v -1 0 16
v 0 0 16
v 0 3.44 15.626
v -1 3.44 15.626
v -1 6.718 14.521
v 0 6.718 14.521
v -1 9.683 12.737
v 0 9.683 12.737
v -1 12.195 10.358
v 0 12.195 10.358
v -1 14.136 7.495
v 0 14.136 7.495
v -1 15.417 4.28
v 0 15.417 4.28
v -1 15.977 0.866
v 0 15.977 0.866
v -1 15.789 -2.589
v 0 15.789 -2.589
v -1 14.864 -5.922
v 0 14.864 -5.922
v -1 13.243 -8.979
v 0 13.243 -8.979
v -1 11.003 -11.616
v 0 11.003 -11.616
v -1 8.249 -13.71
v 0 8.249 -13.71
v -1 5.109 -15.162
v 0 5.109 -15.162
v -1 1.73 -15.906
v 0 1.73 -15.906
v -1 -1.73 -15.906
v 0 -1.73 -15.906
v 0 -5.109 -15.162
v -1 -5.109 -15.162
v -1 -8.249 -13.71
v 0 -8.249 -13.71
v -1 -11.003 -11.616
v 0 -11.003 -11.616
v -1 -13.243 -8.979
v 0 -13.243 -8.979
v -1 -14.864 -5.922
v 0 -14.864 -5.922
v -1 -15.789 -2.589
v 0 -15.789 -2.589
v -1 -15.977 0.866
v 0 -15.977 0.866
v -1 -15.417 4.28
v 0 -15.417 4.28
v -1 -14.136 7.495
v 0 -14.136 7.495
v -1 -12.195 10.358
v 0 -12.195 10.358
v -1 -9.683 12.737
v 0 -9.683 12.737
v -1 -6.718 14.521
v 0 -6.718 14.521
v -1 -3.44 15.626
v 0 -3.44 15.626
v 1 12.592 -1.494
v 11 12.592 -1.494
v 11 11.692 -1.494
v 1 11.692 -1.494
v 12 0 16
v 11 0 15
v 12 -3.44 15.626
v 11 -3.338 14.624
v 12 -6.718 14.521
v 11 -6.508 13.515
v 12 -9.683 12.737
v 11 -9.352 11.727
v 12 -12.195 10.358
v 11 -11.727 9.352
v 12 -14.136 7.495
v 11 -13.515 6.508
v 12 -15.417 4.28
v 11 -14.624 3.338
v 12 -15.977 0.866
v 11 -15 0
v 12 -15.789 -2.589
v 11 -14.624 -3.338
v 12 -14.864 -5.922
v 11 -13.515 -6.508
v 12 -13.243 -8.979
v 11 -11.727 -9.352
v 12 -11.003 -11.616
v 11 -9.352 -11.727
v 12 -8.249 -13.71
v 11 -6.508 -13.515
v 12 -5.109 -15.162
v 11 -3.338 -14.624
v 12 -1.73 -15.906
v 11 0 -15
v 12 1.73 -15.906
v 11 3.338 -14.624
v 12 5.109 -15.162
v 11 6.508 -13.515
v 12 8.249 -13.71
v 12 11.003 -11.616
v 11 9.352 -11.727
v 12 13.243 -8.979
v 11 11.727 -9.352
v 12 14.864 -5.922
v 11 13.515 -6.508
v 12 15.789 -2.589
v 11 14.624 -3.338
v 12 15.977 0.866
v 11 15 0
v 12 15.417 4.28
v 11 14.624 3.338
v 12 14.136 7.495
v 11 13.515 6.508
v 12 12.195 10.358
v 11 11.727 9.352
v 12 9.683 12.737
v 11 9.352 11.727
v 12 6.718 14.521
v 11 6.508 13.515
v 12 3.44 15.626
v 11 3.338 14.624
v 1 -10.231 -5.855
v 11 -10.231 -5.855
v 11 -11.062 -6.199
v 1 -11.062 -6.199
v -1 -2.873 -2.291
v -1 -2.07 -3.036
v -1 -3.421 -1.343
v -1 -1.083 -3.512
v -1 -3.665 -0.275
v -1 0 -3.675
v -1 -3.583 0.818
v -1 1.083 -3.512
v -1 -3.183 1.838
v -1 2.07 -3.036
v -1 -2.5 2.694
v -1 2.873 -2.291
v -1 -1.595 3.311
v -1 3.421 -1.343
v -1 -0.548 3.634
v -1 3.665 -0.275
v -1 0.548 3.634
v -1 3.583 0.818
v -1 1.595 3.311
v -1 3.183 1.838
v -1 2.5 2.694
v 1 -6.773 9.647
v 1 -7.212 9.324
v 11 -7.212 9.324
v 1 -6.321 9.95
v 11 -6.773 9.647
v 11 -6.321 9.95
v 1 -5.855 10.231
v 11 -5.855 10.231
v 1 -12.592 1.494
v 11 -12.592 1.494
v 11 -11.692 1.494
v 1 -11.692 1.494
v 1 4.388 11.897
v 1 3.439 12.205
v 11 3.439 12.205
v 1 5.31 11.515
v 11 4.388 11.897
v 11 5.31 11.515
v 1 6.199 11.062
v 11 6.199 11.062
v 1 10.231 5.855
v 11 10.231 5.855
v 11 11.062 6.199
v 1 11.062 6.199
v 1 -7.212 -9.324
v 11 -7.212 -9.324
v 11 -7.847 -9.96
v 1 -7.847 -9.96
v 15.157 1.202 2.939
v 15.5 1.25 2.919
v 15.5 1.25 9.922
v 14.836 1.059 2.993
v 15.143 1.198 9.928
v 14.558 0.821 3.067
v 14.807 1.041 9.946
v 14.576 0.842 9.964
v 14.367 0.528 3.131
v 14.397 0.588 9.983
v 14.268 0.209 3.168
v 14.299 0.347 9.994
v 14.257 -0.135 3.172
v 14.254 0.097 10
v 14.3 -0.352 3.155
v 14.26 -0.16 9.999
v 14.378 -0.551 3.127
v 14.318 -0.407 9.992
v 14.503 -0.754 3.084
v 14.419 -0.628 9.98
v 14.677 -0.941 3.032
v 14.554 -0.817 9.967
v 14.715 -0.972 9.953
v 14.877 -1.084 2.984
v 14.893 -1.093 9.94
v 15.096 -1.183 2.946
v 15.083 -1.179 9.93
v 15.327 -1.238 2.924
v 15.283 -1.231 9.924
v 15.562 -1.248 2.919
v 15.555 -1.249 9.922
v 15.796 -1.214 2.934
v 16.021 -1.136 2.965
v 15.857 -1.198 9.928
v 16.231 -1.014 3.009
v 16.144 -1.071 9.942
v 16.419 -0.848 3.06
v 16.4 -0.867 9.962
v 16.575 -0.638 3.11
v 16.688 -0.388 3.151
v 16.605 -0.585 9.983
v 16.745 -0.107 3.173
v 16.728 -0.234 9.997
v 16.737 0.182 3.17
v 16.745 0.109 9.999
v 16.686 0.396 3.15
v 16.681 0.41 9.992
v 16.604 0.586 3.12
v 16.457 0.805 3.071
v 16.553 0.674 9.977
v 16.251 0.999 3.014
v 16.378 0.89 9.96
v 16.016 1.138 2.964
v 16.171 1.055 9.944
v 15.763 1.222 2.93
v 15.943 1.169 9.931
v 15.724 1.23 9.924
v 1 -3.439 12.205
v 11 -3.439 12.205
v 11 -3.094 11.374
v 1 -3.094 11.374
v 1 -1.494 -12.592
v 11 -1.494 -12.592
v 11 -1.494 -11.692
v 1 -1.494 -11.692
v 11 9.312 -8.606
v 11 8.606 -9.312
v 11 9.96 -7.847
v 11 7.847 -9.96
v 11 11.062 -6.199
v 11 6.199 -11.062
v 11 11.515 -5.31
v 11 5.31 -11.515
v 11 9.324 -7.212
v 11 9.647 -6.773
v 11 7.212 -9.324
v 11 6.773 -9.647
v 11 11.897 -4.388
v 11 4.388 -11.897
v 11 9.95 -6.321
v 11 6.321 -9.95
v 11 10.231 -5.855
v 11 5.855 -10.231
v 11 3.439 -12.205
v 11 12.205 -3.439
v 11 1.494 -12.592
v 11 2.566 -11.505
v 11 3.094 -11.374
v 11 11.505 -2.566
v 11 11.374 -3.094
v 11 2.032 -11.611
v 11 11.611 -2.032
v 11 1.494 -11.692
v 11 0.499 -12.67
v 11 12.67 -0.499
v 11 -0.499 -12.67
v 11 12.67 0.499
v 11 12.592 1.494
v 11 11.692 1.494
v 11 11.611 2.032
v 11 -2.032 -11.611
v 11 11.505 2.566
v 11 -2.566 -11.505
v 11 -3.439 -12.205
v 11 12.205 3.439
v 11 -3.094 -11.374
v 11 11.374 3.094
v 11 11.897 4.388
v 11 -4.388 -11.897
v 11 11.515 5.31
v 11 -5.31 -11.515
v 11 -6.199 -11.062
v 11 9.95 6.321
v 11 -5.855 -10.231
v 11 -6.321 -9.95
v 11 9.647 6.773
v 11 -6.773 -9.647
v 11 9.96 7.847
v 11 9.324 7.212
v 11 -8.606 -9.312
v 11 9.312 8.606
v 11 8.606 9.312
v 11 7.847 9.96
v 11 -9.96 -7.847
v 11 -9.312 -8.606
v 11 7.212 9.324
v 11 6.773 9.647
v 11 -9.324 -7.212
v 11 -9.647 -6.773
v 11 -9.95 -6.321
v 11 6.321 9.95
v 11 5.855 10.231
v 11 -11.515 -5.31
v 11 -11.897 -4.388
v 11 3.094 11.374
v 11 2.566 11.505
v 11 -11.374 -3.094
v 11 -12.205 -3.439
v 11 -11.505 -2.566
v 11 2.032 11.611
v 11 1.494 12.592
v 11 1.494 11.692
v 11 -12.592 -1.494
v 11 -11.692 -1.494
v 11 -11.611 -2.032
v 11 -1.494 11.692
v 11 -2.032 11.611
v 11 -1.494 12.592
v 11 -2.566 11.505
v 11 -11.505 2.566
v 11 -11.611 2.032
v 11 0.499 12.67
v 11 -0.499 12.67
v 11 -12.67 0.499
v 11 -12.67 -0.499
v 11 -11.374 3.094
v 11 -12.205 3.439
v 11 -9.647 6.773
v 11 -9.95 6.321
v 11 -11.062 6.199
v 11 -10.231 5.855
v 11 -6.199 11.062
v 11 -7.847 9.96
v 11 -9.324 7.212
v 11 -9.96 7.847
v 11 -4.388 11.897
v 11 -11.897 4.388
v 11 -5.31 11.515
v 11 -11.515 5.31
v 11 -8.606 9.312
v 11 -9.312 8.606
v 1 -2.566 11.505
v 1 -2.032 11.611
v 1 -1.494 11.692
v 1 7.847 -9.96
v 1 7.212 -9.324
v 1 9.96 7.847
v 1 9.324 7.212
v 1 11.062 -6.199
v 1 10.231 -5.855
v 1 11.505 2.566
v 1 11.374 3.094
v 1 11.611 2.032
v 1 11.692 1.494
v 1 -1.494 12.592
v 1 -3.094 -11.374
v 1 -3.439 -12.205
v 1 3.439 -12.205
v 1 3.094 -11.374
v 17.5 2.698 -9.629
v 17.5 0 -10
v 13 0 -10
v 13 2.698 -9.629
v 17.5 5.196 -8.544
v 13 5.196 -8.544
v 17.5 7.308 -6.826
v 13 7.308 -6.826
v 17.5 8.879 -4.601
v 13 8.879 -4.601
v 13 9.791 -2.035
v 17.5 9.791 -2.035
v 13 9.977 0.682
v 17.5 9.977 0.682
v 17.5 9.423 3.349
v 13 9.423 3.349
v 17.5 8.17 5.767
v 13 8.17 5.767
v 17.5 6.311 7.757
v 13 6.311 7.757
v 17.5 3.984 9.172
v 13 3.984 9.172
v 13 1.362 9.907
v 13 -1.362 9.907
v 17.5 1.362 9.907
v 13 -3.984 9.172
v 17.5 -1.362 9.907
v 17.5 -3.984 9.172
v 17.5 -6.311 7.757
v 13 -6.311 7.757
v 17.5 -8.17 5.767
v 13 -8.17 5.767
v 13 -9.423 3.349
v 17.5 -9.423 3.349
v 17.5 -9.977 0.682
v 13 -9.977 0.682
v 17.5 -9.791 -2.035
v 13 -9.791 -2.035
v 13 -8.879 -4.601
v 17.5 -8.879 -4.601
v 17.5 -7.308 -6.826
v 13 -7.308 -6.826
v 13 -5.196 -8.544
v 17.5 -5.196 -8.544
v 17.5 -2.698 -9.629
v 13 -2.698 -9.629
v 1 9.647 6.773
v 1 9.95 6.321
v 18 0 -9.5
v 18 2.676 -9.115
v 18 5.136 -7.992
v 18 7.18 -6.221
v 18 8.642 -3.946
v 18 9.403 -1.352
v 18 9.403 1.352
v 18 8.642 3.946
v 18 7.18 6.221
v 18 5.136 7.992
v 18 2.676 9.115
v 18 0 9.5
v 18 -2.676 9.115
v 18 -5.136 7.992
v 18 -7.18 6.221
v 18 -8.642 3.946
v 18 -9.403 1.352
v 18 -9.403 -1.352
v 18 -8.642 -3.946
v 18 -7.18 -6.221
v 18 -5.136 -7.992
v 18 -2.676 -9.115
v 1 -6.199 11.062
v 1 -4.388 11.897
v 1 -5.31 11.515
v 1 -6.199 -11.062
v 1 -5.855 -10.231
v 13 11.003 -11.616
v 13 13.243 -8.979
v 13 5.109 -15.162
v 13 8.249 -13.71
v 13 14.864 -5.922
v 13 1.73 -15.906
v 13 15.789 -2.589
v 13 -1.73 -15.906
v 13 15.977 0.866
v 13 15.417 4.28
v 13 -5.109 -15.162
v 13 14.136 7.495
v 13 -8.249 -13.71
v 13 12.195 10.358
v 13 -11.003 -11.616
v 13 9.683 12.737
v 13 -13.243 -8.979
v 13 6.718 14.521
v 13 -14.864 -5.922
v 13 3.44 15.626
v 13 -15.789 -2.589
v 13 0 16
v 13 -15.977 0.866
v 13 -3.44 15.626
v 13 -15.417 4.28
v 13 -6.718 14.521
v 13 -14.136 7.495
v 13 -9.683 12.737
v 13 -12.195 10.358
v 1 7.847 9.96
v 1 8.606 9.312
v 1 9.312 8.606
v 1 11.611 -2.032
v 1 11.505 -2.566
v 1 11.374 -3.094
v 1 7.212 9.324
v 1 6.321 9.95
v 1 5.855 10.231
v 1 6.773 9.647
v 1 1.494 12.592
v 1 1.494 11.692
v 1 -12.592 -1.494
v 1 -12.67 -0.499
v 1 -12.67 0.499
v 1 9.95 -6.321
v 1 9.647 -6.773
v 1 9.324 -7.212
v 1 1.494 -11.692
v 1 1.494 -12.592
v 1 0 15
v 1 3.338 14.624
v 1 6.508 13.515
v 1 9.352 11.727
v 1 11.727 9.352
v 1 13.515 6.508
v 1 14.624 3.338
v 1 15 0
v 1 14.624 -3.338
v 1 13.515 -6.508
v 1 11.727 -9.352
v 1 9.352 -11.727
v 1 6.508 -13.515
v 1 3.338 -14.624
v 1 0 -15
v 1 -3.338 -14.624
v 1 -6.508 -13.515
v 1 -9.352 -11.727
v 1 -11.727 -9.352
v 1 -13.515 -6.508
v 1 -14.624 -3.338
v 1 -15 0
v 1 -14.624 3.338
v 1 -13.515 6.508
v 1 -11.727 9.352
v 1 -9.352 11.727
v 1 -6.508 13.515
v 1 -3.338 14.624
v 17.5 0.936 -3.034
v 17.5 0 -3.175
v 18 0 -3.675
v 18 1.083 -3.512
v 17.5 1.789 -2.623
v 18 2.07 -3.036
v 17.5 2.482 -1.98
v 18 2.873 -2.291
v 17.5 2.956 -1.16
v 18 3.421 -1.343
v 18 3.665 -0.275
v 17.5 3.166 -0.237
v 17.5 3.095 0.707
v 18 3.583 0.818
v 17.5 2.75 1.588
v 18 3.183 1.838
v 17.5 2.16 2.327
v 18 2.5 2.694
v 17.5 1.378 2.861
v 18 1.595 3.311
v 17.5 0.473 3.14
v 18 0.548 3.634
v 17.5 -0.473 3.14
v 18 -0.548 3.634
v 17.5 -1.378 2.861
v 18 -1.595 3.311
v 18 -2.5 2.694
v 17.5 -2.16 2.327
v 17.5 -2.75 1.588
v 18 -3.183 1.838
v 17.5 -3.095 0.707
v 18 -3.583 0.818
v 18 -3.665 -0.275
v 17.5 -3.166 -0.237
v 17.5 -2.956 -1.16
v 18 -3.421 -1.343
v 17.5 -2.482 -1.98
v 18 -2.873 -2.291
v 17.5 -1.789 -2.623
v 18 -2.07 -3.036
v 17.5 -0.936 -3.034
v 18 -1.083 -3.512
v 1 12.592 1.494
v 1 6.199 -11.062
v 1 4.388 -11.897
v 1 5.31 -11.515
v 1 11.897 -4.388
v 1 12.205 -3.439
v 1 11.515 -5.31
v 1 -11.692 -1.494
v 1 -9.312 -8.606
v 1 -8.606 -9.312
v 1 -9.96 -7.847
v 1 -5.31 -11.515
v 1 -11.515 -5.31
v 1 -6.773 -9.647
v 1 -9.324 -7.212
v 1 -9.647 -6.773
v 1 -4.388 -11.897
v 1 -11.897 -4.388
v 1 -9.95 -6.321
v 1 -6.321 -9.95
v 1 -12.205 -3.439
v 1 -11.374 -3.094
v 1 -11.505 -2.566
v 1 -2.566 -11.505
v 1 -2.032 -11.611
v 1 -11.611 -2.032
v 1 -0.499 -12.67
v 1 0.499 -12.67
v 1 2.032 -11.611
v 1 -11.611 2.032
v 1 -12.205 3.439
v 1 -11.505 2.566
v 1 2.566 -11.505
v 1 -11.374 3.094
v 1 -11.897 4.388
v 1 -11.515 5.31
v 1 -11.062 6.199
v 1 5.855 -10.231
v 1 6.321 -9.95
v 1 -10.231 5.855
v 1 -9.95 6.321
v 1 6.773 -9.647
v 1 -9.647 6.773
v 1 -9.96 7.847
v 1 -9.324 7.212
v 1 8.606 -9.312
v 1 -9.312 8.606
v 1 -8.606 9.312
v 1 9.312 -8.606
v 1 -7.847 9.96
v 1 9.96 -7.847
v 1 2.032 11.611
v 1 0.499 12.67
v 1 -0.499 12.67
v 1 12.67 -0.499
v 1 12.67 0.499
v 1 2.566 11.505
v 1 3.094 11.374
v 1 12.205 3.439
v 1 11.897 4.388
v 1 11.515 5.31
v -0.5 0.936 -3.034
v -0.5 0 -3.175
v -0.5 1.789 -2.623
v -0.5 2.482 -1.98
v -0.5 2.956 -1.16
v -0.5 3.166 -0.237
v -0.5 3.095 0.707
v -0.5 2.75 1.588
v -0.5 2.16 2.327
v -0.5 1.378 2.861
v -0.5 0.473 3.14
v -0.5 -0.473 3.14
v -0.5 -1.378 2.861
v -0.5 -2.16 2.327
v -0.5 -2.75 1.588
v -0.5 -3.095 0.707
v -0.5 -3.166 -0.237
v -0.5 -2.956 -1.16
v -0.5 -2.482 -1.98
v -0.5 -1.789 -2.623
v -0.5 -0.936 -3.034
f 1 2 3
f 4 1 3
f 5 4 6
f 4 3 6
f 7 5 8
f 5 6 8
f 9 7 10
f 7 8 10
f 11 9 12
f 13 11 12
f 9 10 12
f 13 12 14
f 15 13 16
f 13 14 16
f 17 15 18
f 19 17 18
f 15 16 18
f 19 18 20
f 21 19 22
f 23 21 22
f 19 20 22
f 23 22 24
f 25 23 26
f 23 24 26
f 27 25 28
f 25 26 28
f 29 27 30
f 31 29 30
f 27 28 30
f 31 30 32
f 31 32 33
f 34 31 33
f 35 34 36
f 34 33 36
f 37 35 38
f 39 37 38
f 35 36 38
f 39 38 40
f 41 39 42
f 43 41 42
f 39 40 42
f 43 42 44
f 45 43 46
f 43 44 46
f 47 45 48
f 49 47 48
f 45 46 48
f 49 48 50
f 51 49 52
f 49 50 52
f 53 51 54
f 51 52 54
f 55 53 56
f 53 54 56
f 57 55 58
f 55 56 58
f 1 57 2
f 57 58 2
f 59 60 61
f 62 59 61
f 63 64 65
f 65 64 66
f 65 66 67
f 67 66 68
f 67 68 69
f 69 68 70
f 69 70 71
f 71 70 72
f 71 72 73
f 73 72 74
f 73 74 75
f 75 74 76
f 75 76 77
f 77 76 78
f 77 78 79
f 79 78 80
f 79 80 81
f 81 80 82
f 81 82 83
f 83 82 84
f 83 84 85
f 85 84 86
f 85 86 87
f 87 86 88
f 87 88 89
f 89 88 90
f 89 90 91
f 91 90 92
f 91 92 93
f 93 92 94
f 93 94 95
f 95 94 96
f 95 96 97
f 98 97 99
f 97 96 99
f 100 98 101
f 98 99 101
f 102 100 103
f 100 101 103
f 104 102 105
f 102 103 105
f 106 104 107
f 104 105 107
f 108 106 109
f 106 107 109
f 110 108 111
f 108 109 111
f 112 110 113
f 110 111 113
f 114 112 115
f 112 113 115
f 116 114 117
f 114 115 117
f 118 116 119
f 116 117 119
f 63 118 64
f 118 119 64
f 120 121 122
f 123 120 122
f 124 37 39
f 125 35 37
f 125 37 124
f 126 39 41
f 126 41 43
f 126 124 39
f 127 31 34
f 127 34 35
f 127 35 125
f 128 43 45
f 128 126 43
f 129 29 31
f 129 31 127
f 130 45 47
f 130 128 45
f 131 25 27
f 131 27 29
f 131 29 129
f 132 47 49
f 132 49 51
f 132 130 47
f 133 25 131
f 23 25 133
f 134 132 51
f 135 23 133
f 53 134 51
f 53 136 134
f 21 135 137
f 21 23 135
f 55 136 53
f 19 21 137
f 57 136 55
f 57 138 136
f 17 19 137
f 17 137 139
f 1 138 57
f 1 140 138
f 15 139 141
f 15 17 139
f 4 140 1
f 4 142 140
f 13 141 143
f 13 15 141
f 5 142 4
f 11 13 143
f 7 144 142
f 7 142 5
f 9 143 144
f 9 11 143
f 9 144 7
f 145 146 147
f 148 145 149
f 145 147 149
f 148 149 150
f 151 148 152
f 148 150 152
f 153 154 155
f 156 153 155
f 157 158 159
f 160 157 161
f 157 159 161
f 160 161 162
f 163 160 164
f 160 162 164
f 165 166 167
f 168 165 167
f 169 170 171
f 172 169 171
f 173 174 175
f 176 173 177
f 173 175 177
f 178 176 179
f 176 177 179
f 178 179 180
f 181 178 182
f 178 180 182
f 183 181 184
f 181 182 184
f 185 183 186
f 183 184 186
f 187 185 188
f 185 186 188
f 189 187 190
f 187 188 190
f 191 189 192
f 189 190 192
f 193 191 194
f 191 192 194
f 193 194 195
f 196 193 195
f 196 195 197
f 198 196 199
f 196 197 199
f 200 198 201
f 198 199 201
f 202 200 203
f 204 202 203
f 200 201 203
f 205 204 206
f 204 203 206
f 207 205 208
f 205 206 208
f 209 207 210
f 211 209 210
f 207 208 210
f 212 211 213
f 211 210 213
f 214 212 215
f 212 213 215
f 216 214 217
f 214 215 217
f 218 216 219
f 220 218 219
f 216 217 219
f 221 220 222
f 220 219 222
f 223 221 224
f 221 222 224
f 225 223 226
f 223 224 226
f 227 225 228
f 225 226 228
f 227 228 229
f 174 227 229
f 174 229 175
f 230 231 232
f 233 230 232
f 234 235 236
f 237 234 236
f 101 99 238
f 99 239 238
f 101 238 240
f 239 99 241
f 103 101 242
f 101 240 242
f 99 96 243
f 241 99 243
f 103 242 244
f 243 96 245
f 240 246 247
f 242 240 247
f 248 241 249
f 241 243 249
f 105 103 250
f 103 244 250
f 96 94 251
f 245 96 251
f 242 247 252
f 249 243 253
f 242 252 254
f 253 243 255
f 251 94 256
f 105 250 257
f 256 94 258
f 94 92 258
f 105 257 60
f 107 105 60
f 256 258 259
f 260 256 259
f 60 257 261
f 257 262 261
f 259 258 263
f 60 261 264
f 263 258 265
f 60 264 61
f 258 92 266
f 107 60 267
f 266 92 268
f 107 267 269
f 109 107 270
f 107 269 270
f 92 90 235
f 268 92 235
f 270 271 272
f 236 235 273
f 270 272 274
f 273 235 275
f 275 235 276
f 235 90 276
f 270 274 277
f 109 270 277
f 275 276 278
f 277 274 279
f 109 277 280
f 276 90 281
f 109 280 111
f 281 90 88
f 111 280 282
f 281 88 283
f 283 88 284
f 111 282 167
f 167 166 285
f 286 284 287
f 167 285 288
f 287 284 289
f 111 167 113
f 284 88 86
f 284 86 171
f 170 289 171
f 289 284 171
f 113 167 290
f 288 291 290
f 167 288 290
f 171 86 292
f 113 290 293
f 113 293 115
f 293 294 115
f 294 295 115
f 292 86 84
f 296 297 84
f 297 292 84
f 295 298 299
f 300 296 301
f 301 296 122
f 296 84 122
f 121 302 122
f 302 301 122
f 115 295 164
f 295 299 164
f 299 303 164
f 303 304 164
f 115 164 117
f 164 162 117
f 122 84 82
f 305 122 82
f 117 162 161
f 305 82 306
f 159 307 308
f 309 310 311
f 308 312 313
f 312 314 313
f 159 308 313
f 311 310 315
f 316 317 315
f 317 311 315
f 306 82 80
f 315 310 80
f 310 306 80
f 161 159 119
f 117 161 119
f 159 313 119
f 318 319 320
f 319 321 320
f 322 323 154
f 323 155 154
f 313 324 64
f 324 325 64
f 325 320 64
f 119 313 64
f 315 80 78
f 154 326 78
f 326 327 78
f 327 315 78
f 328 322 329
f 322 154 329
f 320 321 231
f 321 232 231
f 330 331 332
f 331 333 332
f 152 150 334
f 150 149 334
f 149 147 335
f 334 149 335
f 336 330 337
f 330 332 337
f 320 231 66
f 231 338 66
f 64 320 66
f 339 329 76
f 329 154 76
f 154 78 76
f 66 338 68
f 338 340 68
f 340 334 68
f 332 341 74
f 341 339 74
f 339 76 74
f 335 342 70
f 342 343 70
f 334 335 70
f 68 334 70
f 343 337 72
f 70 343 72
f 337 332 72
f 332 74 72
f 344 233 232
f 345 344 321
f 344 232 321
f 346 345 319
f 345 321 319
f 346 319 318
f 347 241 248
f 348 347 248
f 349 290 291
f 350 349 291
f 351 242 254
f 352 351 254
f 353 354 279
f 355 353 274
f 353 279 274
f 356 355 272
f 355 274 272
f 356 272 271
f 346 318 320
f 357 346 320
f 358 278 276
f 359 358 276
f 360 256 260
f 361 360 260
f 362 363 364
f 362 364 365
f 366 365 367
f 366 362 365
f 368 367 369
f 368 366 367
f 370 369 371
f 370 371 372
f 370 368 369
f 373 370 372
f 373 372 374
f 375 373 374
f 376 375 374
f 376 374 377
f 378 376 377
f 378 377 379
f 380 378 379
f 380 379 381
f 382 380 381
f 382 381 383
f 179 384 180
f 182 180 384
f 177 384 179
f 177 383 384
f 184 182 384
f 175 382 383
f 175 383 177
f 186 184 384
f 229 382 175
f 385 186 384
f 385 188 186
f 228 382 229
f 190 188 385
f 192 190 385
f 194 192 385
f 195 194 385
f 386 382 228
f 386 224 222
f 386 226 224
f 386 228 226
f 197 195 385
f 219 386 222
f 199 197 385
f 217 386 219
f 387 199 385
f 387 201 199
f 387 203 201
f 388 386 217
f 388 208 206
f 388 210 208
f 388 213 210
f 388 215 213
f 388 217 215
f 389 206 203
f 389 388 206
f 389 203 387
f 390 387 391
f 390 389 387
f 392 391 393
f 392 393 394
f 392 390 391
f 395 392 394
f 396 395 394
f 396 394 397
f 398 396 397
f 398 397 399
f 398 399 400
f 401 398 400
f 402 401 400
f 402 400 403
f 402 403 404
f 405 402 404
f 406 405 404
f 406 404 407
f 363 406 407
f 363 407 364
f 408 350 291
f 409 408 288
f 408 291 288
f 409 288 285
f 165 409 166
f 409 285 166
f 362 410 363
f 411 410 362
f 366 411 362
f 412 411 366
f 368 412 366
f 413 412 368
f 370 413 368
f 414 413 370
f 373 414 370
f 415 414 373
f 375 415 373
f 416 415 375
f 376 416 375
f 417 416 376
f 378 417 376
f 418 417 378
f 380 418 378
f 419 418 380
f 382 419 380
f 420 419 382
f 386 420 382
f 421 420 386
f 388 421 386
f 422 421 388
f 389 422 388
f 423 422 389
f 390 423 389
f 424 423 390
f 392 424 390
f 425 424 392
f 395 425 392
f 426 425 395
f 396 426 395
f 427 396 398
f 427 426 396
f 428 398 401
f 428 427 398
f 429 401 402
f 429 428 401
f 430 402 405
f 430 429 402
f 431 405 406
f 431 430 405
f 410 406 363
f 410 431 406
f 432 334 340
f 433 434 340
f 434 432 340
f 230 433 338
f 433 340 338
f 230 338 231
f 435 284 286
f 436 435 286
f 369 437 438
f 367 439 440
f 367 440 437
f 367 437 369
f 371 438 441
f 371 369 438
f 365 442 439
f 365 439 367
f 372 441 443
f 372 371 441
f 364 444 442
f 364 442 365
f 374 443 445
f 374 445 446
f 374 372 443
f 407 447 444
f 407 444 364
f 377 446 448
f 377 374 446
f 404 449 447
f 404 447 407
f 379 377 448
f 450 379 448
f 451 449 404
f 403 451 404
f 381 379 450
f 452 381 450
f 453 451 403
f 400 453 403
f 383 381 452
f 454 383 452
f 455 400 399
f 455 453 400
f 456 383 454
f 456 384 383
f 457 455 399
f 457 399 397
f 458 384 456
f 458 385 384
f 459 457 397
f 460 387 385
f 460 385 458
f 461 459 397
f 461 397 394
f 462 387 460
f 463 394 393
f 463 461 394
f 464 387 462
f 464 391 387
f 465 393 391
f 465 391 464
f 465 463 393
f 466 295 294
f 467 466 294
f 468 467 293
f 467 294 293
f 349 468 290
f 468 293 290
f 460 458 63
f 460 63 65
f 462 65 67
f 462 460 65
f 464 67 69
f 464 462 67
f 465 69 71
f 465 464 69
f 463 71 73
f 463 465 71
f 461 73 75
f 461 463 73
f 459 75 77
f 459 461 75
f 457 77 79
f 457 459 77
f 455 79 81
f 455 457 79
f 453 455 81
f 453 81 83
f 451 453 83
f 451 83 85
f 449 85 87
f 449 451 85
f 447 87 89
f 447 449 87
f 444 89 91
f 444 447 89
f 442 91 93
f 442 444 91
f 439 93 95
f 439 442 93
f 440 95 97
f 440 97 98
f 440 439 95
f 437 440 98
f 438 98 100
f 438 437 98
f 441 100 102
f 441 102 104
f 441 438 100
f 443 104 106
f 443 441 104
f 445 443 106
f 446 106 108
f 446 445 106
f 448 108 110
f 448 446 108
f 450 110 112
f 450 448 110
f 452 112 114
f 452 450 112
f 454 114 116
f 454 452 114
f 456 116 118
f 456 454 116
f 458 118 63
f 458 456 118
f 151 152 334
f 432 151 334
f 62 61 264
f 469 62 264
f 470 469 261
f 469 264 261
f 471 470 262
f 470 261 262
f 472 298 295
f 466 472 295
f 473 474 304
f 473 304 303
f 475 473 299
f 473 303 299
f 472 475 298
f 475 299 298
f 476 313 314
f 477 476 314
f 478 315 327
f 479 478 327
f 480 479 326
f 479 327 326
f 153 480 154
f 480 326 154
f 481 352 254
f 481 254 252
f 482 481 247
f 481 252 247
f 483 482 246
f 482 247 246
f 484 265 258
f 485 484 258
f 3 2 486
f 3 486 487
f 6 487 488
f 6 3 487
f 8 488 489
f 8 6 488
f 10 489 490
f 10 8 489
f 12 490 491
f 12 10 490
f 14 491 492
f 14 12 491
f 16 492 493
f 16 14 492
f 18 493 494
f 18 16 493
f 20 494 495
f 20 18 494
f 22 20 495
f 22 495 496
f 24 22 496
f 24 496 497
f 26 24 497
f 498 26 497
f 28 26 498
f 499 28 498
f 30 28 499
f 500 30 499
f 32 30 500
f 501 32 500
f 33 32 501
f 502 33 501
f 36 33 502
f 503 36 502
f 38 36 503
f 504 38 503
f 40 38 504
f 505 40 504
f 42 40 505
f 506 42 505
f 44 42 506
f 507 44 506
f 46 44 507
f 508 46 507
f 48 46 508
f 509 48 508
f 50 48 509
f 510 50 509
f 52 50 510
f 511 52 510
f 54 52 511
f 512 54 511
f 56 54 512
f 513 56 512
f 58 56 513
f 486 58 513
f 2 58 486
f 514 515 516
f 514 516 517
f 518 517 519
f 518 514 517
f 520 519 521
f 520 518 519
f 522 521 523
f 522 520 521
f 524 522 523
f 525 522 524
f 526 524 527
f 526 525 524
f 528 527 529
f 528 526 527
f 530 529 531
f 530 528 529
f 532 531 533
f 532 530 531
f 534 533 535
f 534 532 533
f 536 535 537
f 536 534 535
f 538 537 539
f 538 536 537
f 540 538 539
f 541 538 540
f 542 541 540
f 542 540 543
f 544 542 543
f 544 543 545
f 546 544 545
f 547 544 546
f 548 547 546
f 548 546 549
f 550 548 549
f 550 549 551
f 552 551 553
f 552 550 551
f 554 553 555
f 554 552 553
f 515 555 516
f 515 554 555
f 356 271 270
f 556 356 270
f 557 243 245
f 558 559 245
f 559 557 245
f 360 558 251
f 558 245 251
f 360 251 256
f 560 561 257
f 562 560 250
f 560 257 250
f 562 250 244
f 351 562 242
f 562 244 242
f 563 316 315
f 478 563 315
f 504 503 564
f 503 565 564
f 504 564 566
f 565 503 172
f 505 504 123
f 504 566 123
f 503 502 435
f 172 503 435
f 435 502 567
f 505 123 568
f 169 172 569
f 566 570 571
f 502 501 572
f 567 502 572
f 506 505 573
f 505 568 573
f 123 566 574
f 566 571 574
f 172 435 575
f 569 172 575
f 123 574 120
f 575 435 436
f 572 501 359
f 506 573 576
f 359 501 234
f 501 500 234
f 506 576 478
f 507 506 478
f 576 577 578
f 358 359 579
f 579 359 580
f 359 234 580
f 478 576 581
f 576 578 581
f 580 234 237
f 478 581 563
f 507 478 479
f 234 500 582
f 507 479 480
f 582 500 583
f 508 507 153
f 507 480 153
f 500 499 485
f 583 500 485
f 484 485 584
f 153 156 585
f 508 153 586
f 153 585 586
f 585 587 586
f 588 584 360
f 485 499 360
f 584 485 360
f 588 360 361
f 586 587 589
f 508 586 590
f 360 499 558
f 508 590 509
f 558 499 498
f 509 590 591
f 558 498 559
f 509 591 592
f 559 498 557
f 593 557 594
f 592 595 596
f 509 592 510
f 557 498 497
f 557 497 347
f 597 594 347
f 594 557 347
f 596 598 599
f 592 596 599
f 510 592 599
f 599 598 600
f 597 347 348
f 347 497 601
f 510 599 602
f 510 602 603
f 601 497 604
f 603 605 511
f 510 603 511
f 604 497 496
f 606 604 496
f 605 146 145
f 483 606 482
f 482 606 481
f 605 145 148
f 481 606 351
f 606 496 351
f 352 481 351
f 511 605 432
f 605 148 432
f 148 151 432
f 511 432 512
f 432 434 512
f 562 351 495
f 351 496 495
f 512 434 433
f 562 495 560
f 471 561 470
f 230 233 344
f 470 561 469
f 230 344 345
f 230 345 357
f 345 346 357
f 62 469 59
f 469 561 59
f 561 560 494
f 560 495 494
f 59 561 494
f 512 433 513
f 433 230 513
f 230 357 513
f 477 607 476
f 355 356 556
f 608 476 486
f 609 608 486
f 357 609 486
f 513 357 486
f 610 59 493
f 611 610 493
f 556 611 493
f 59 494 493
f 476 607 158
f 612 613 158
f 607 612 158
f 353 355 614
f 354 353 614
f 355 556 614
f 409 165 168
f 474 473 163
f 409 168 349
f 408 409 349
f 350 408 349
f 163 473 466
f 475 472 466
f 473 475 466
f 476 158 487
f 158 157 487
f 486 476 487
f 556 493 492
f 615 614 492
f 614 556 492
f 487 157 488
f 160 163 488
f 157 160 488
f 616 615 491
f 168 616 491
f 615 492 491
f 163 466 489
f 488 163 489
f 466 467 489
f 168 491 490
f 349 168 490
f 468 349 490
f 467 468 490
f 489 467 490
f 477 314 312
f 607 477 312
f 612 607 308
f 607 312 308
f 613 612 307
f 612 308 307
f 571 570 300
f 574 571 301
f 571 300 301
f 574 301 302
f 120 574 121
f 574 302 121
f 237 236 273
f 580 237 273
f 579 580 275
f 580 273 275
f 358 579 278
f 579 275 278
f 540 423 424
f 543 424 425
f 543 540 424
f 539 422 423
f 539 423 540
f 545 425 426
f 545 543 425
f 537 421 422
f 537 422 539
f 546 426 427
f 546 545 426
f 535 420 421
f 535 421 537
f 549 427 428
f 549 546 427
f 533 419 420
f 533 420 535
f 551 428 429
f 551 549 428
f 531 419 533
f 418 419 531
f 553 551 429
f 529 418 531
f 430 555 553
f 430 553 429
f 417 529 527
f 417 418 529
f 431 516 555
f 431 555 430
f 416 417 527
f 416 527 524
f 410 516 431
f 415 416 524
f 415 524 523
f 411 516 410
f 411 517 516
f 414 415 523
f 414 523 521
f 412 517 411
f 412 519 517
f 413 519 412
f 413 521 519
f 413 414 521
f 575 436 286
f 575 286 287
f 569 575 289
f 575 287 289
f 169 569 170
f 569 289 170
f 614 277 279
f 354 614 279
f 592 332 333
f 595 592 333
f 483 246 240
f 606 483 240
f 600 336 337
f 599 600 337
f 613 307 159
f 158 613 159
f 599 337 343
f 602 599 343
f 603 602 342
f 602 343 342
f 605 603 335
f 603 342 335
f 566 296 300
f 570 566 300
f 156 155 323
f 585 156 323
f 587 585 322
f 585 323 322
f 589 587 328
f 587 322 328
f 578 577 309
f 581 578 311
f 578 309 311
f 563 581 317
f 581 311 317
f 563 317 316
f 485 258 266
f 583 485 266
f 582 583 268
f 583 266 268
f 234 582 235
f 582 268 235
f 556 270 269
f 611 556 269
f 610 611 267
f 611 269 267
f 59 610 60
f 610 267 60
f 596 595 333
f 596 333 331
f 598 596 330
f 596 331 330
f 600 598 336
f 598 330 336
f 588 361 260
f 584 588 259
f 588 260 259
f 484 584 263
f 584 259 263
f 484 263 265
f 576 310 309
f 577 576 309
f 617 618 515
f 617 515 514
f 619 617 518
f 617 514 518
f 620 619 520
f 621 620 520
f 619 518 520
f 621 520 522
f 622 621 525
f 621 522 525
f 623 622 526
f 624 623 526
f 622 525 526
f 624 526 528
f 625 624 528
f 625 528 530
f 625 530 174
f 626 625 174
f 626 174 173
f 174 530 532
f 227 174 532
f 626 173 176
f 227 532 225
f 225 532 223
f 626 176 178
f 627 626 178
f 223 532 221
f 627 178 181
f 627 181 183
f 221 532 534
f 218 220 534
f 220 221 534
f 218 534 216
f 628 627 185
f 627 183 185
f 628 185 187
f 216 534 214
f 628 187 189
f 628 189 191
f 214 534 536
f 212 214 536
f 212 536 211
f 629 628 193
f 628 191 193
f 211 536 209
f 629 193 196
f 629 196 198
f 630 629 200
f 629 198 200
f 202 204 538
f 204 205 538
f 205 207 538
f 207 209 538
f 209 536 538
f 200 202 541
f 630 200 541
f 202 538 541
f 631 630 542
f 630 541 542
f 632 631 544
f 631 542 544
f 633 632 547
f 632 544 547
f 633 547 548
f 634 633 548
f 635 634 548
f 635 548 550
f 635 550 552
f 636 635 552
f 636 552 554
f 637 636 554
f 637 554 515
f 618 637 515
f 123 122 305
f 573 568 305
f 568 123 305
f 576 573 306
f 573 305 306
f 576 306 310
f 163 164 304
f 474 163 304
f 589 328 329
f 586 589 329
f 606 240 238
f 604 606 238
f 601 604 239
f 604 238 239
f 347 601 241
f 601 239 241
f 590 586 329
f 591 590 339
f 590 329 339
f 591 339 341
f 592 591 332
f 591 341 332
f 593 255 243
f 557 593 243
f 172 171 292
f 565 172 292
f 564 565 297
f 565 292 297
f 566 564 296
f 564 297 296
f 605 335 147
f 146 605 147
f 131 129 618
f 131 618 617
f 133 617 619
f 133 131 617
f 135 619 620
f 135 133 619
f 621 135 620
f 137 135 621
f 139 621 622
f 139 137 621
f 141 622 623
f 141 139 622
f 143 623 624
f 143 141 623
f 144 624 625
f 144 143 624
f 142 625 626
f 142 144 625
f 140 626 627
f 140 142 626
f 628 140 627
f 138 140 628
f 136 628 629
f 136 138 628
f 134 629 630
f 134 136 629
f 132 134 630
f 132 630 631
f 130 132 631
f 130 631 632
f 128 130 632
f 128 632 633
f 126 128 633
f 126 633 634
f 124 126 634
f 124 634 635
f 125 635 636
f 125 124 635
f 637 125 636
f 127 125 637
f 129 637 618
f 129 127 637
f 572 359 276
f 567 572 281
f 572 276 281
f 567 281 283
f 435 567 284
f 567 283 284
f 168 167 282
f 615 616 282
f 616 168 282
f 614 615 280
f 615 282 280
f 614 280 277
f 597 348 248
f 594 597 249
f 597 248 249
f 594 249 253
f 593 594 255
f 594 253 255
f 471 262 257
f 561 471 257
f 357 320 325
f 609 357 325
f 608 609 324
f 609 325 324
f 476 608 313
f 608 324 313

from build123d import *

# Parameters (mm, degrees)
BOSS_EXTRUDE1_START       = -13
BOSS_EXTRUDE1_DEPTH       = 14
BOSS_EXTRUDE1_START_2     = -25
BOSS_EXTRUDE1_2_OUTLINE_R = 9
BOSS_EXTRUDE1_2_DEPTH     = 12
BOSS_EXTRUDE1_START_3     = -1
BOSS_EXTRUDE1_3_OUTLINE_R = 16
BOSS_EXTRUDE1_3_DEPTH     = 2
BOSS_EXTRUDE1_4_OUTLINE_R = 14.25
BOSS_EXTRUDE1_4_DEPTH     = 0.9999999
SKETCH2_R                 = 9
CUT_EXTRUDE1_DEPTH        = 7
SKETCH3_R                 = 10
BOSS_EXTRUDE2_DEPTH       = 5
SKETCH8_R                 = 16
BOSS_EXTRUDE3_DEPTH       = 2
CHAMFER1_SIZE             = 1
SKETCH4_R                 = 3.175
CUT_EXTRUDE2_DEPTH        = 30.546573405
CHAMFER2_SIZE             = 0.5
SKETCH7_W                 = 1.25
SKETCH7_H                 = 16


with BuildPart() as part:
    # Boss-Extrude1: read off the stored shape, not the designer's step
    # Boss-Extrude1 outline → Boss-Extrude1 (new body)
    with BuildSketch(Plane.ZY.offset(BOSS_EXTRUDE1_START)):
        with BuildLine():
            ThreePointArc((-1.493827307, 11.692460658), (-2.299627171, 11.561006493), (-3.094394503, 11.374088047))
            Line((-3.094394503, 11.374088047), (-3.438518062, 12.20487581))
            ThreePointArc((-3.438518062, 12.20487581), (-4.852425922, 11.714792472), (-6.19875101, 11.061549888))
            Line((-6.19875101, 11.061549888), (-5.854627451, 10.230762125))
            ThreePointArc((-5.854627451, 10.230762125), (-6.548784122, 9.800948055), (-7.211522801, 9.324113638))
            Line((-7.211522801, 9.324113638), (-7.847380226, 9.959971063))
            ThreePointArc((-7.847380226, 9.959971063), (-8.966113985, 8.966113985), (-9.959971063, 7.847380226))
            Line((-9.959971063, 7.847380226), (-9.324113638, 7.211522801))
            ThreePointArc((-9.324113638, 7.211522801), (-9.800948055, 6.548784122), (-10.230762125, 5.854627451))
            Line((-10.230762125, 5.854627451), (-11.061549888, 6.19875101))
            ThreePointArc((-11.061549888, 6.19875101), (-11.714792472, 4.852425922), (-12.20487581, 3.438518062))
            Line((-12.20487581, 3.438518062), (-11.374088047, 3.094394503))
            ThreePointArc((-11.374088047, 3.094394503), (-11.561006493, 2.299627171), (-11.692460658, 1.493827307))
            Line((-11.692460658, 1.493827307), (-12.591698852, 1.493827307))
            ThreePointArc((-12.591698852, 1.493827307), (-12.68, 0), (-12.591698852, -1.493827307))
            Line((-12.591698852, -1.493827307), (-11.692460658, -1.493827307))
            ThreePointArc((-11.692460658, -1.493827307), (-11.561006493, -2.299627171), (-11.374088047, -3.094394503))
            Line((-11.374088047, -3.094394503), (-12.20487581, -3.438518062))
            ThreePointArc((-12.20487581, -3.438518062), (-11.714792472, -4.852425922), (-11.061549888, -6.19875101))
            Line((-11.061549888, -6.19875101), (-10.230762125, -5.854627451))
            ThreePointArc((-10.230762125, -5.854627451), (-9.800948055, -6.548784122), (-9.324113638, -7.211522801))
            Line((-9.324113638, -7.211522801), (-9.959971063, -7.847380226))
            ThreePointArc((-9.959971063, -7.847380226), (-8.966113985, -8.966113985), (-7.847380226, -9.959971063))
            Line((-7.847380226, -9.959971063), (-7.211522801, -9.324113638))
            ThreePointArc((-7.211522801, -9.324113638), (-6.548784122, -9.800948055), (-5.854627451, -10.230762125))
            Line((-5.854627451, -10.230762125), (-6.19875101, -11.061549888))
            ThreePointArc((-6.19875101, -11.061549888), (-4.852425922, -11.714792472), (-3.438518062, -12.20487581))
            Line((-3.438518062, -12.20487581), (-3.094394503, -11.374088047))
            ThreePointArc((-3.094394503, -11.374088047), (-2.299627171, -11.561006493), (-1.493827307, -11.692460658))
            Line((-1.493827307, -11.692460658), (-1.493827307, -12.591698852))
            ThreePointArc((-1.493827307, -12.591698852), (0, -12.68), (1.493827307, -12.591698852))
            Line((1.493827307, -12.591698852), (1.493827307, -11.692460658))
            ThreePointArc((1.493827307, -11.692460658), (2.299627171, -11.561006493), (3.094394503, -11.374088047))
            Line((3.094394503, -11.374088047), (3.438518062, -12.20487581))
            ThreePointArc((3.438518062, -12.20487581), (4.852425922, -11.714792472), (6.19875101, -11.061549888))
            Line((6.19875101, -11.061549888), (5.854627451, -10.230762125))
            ThreePointArc((5.854627451, -10.230762125), (6.548784122, -9.800948055), (7.211522801, -9.324113638))
            Line((7.211522801, -9.324113638), (7.847380226, -9.959971063))
            ThreePointArc((7.847380226, -9.959971063), (8.966113985, -8.966113985), (9.959971063, -7.847380226))
            Line((9.959971063, -7.847380226), (9.324113638, -7.211522801))
            ThreePointArc((9.324113638, -7.211522801), (9.800948055, -6.548784122), (10.230762125, -5.854627451))
            Line((10.230762125, -5.854627451), (11.061549888, -6.19875101))
            ThreePointArc((11.061549888, -6.19875101), (11.714792472, -4.852425922), (12.20487581, -3.438518062))
            Line((12.20487581, -3.438518062), (11.374088047, -3.094394503))
            ThreePointArc((11.374088047, -3.094394503), (11.561006493, -2.299627171), (11.692460658, -1.493827307))
            Line((11.692460658, -1.493827307), (12.591698852, -1.493827307))
            ThreePointArc((12.591698852, -1.493827307), (12.68, 0), (12.591698852, 1.493827307))
            Line((12.591698852, 1.493827307), (11.692460658, 1.493827307))
            ThreePointArc((11.692460658, 1.493827307), (11.561006493, 2.299627171), (11.374088047, 3.094394503))
            Line((11.374088047, 3.094394503), (12.20487581, 3.438518062))
            ThreePointArc((12.20487581, 3.438518062), (11.714792472, 4.852425922), (11.061549888, 6.19875101))
            Line((11.061549888, 6.19875101), (10.230762125, 5.854627451))
            ThreePointArc((10.230762125, 5.854627451), (9.800948055, 6.548784122), (9.324113638, 7.211522801))
            Line((9.324113638, 7.211522801), (9.959971063, 7.847380226))
            ThreePointArc((9.959971063, 7.847380226), (8.966113985, 8.966113985), (7.847380226, 9.959971063))
            Line((7.847380226, 9.959971063), (7.211522801, 9.324113638))
            ThreePointArc((7.211522801, 9.324113638), (6.548784122, 9.800948055), (5.854627451, 10.230762125))
            Line((5.854627451, 10.230762125), (6.19875101, 11.061549888))
            ThreePointArc((6.19875101, 11.061549888), (4.852425922, 11.714792472), (3.438518062, 12.20487581))
            Line((3.438518062, 12.20487581), (3.094394503, 11.374088047))
            ThreePointArc((3.094394503, 11.374088047), (2.299627171, 11.561006493), (1.493827307, 11.692460658))
            Line((1.493827307, 11.692460658), (1.493827307, 12.591698852))
            ThreePointArc((1.493827307, 12.591698852), (0, 12.68), (-1.493827307, 12.591698852))
            Line((-1.493827307, 12.591698852), (-1.493827307, 11.692460658))
        make_face()
    extrude(amount=BOSS_EXTRUDE1_DEPTH)

    # Boss-Extrude1 2 outline → Boss-Extrude1 2 (add)
    with BuildSketch(Plane.ZY.offset(BOSS_EXTRUDE1_START_2)):
        Circle(BOSS_EXTRUDE1_2_OUTLINE_R)
    extrude(amount=BOSS_EXTRUDE1_2_DEPTH)

    # Boss-Extrude1 3 outline → Boss-Extrude1 3 (add)
    with BuildSketch(Plane.ZY.offset(BOSS_EXTRUDE1_START_3)):
        Circle(BOSS_EXTRUDE1_3_OUTLINE_R)
        with BuildLine():
            Line((-3.438518062, 12.20487581), (-3.094394503, 11.374088047))
            ThreePointArc((-3.094394503, 11.374088047), (-2.299627171, 11.561006493), (-1.493827307, 11.692460658))
            Line((-1.493827307, 11.692460658), (-1.493827307, 12.591698852))
            ThreePointArc((-1.493827307, 12.591698852), (0, 12.68), (1.493827307, 12.591698852))
            Line((1.493827307, 12.591698852), (1.493827307, 11.692460658))
            ThreePointArc((1.493827307, 11.692460658), (2.299627171, 11.561006493), (3.094394503, 11.374088047))
            Line((3.094394503, 11.374088047), (3.438518062, 12.20487581))
            ThreePointArc((3.438518062, 12.20487581), (4.852425922, 11.714792472), (6.19875101, 11.061549888))
            Line((6.19875101, 11.061549888), (5.854627451, 10.230762125))
            ThreePointArc((5.854627451, 10.230762125), (6.548784122, 9.800948055), (7.211522801, 9.324113638))
            Line((7.211522801, 9.324113638), (7.847380226, 9.959971063))
            ThreePointArc((7.847380226, 9.959971063), (8.966113985, 8.966113985), (9.959971063, 7.847380226))
            Line((9.959971063, 7.847380226), (9.324113638, 7.211522801))
            ThreePointArc((9.324113638, 7.211522801), (9.800948055, 6.548784122), (10.230762125, 5.854627451))
            Line((10.230762125, 5.854627451), (11.061549888, 6.19875101))
            ThreePointArc((11.061549888, 6.19875101), (11.714792472, 4.852425922), (12.20487581, 3.438518062))
            Line((12.20487581, 3.438518062), (11.374088047, 3.094394503))
            ThreePointArc((11.374088047, 3.094394503), (11.561006493, 2.299627171), (11.692460658, 1.493827307))
            Line((11.692460658, 1.493827307), (12.591698852, 1.493827307))
            ThreePointArc((12.591698852, 1.493827307), (12.68, 0), (12.591698852, -1.493827307))
            Line((12.591698852, -1.493827307), (11.692460658, -1.493827307))
            ThreePointArc((11.692460658, -1.493827307), (11.561006493, -2.299627171), (11.374088047, -3.094394503))
            Line((11.374088047, -3.094394503), (12.20487581, -3.438518062))
            ThreePointArc((12.20487581, -3.438518062), (11.714792472, -4.852425922), (11.061549888, -6.19875101))
            Line((11.061549888, -6.19875101), (10.230762125, -5.854627451))
            ThreePointArc((10.230762125, -5.854627451), (9.800948055, -6.548784122), (9.324113638, -7.211522801))
            Line((9.324113638, -7.211522801), (9.959971063, -7.847380226))
            ThreePointArc((9.959971063, -7.847380226), (8.966113985, -8.966113985), (7.847380226, -9.959971063))
            Line((7.847380226, -9.959971063), (7.211522801, -9.324113638))
            ThreePointArc((7.211522801, -9.324113638), (6.548784122, -9.800948055), (5.854627451, -10.230762125))
            Line((5.854627451, -10.230762125), (6.19875101, -11.061549888))
            ThreePointArc((6.19875101, -11.061549888), (4.852425922, -11.714792472), (3.438518062, -12.20487581))
            Line((3.438518062, -12.20487581), (3.094394503, -11.374088047))
            ThreePointArc((3.094394503, -11.374088047), (2.299627171, -11.561006493), (1.493827307, -11.692460658))
            Line((1.493827307, -11.692460658), (1.493827307, -12.591698852))
            ThreePointArc((1.493827307, -12.591698852), (0, -12.68), (-1.493827307, -12.591698852))
            Line((-1.493827307, -12.591698852), (-1.493827307, -11.692460658))
            ThreePointArc((-1.493827307, -11.692460658), (-2.299627171, -11.561006493), (-3.094394503, -11.374088047))
            Line((-3.094394503, -11.374088047), (-3.438518062, -12.20487581))
            ThreePointArc((-3.438518062, -12.20487581), (-4.852425922, -11.714792472), (-6.19875101, -11.061549888))
            Line((-6.19875101, -11.061549888), (-5.854627451, -10.230762125))
            ThreePointArc((-5.854627451, -10.230762125), (-6.548784122, -9.800948055), (-7.211522801, -9.324113638))
            Line((-7.211522801, -9.324113638), (-7.847380226, -9.959971063))
            ThreePointArc((-7.847380226, -9.959971063), (-8.966113985, -8.966113985), (-9.959971063, -7.847380226))
            Line((-9.959971063, -7.847380226), (-9.324113638, -7.211522801))
            ThreePointArc((-9.324113638, -7.211522801), (-9.800948055, -6.548784122), (-10.230762125, -5.854627451))
            Line((-10.230762125, -5.854627451), (-11.061549888, -6.19875101))
            ThreePointArc((-11.061549888, -6.19875101), (-11.714792472, -4.852425922), (-12.20487581, -3.438518062))
            Line((-12.20487581, -3.438518062), (-11.374088047, -3.094394503))
            ThreePointArc((-11.374088047, -3.094394503), (-11.561006493, -2.299627171), (-11.692460658, -1.493827307))
            Line((-11.692460658, -1.493827307), (-12.591698852, -1.493827307))
            ThreePointArc((-12.591698852, -1.493827307), (-12.68, 0), (-12.591698852, 1.493827307))
            Line((-12.591698852, 1.493827307), (-11.692460658, 1.493827307))
            ThreePointArc((-11.692460658, 1.493827307), (-11.561006493, 2.299627171), (-11.374088047, 3.094394503))
            Line((-11.374088047, 3.094394503), (-12.20487581, 3.438518062))
            ThreePointArc((-12.20487581, 3.438518062), (-11.714792472, 4.852425922), (-11.061549888, 6.19875101))
            Line((-11.061549888, 6.19875101), (-10.230762125, 5.854627451))
            ThreePointArc((-10.230762125, 5.854627451), (-9.800948055, 6.548784122), (-9.324113638, 7.211522801))
            Line((-9.324113638, 7.211522801), (-9.959971063, 7.847380226))
            ThreePointArc((-9.959971063, 7.847380226), (-8.966113985, 8.966113985), (-7.847380226, 9.959971063))
            Line((-7.847380226, 9.959971063), (-7.211522801, 9.324113638))
            ThreePointArc((-7.211522801, 9.324113638), (-6.548784122, 9.800948055), (-5.854627451, 10.230762125))
            Line((-5.854627451, 10.230762125), (-6.19875101, 11.061549888))
            ThreePointArc((-6.19875101, 11.061549888), (-4.852425922, 11.714792472), (-3.438518062, 12.20487581))
        make_face(mode=Mode.SUBTRACT)
    extrude(amount=BOSS_EXTRUDE1_3_DEPTH)

    # Boss-Extrude1 4 outline → Boss-Extrude1 4 (add)
    with BuildSketch(Plane.ZY.offset(BOSS_EXTRUDE1_START)):
        Circle(BOSS_EXTRUDE1_4_OUTLINE_R)
        with BuildLine():
            Line((-3.438518062, 12.20487581), (-3.094394503, 11.374088047))
            ThreePointArc((-3.094394503, 11.374088047), (-2.299627171, 11.561006493), (-1.493827307, 11.692460658))
            Line((-1.493827307, 11.692460658), (-1.493827307, 12.591698852))
            ThreePointArc((-1.493827307, 12.591698852), (0, 12.68), (1.493827307, 12.591698852))
            Line((1.493827307, 12.591698852), (1.493827307, 11.692460658))
            ThreePointArc((1.493827307, 11.692460658), (2.299627171, 11.561006493), (3.094394503, 11.374088047))
            Line((3.094394503, 11.374088047), (3.438518062, 12.20487581))
            ThreePointArc((3.438518062, 12.20487581), (4.852425922, 11.714792472), (6.19875101, 11.061549888))
            Line((6.19875101, 11.061549888), (5.854627451, 10.230762125))
            ThreePointArc((5.854627451, 10.230762125), (6.548784122, 9.800948055), (7.211522801, 9.324113638))
            Line((7.211522801, 9.324113638), (7.847380226, 9.959971063))
            ThreePointArc((7.847380226, 9.959971063), (8.966113985, 8.966113985), (9.959971063, 7.847380226))
            Line((9.959971063, 7.847380226), (9.324113638, 7.211522801))
            ThreePointArc((9.324113638, 7.211522801), (9.800948055, 6.548784122), (10.230762125, 5.854627451))
            Line((10.230762125, 5.854627451), (11.061549888, 6.19875101))
            ThreePointArc((11.061549888, 6.19875101), (11.714792472, 4.852425922), (12.20487581, 3.438518062))
            Line((12.20487581, 3.438518062), (11.374088047, 3.094394503))
            ThreePointArc((11.374088047, 3.094394503), (11.561006493, 2.299627171), (11.692460658, 1.493827307))
            Line((11.692460658, 1.493827307), (12.591698852, 1.493827307))
            ThreePointArc((12.591698852, 1.493827307), (12.68, 0), (12.591698852, -1.493827307))
            Line((12.591698852, -1.493827307), (11.692460658, -1.493827307))
            ThreePointArc((11.692460658, -1.493827307), (11.561006493, -2.299627171), (11.374088047, -3.094394503))
            Line((11.374088047, -3.094394503), (12.20487581, -3.438518062))
            ThreePointArc((12.20487581, -3.438518062), (11.714792472, -4.852425922), (11.061549888, -6.19875101))
            Line((11.061549888, -6.19875101), (10.230762125, -5.854627451))
            ThreePointArc((10.230762125, -5.854627451), (9.800948055, -6.548784122), (9.324113638, -7.211522801))
            Line((9.324113638, -7.211522801), (9.959971063, -7.847380226))
            ThreePointArc((9.959971063, -7.847380226), (8.966113985, -8.966113985), (7.847380226, -9.959971063))
            Line((7.847380226, -9.959971063), (7.211522801, -9.324113638))
            ThreePointArc((7.211522801, -9.324113638), (6.548784122, -9.800948055), (5.854627451, -10.230762125))
            Line((5.854627451, -10.230762125), (6.19875101, -11.061549888))
            ThreePointArc((6.19875101, -11.061549888), (4.852425922, -11.714792472), (3.438518062, -12.20487581))
            Line((3.438518062, -12.20487581), (3.094394503, -11.374088047))
            ThreePointArc((3.094394503, -11.374088047), (2.299627171, -11.561006493), (1.493827307, -11.692460658))
            Line((1.493827307, -11.692460658), (1.493827307, -12.591698852))
            ThreePointArc((1.493827307, -12.591698852), (0, -12.68), (-1.493827307, -12.591698852))
            Line((-1.493827307, -12.591698852), (-1.493827307, -11.692460658))
            ThreePointArc((-1.493827307, -11.692460658), (-2.299627171, -11.561006493), (-3.094394503, -11.374088047))
            Line((-3.094394503, -11.374088047), (-3.438518062, -12.20487581))
            ThreePointArc((-3.438518062, -12.20487581), (-4.852425922, -11.714792472), (-6.19875101, -11.061549888))
            Line((-6.19875101, -11.061549888), (-5.854627451, -10.230762125))
            ThreePointArc((-5.854627451, -10.230762125), (-6.548784122, -9.800948055), (-7.211522801, -9.324113638))
            Line((-7.211522801, -9.324113638), (-7.847380226, -9.959971063))
            ThreePointArc((-7.847380226, -9.959971063), (-8.966113985, -8.966113985), (-9.959971063, -7.847380226))
            Line((-9.959971063, -7.847380226), (-9.324113638, -7.211522801))
            ThreePointArc((-9.324113638, -7.211522801), (-9.800948055, -6.548784122), (-10.230762125, -5.854627451))
            Line((-10.230762125, -5.854627451), (-11.061549888, -6.19875101))
            ThreePointArc((-11.061549888, -6.19875101), (-11.714792472, -4.852425922), (-12.20487581, -3.438518062))
            Line((-12.20487581, -3.438518062), (-11.374088047, -3.094394503))
            ThreePointArc((-11.374088047, -3.094394503), (-11.561006493, -2.299627171), (-11.692460658, -1.493827307))
            Line((-11.692460658, -1.493827307), (-12.591698852, -1.493827307))
            ThreePointArc((-12.591698852, -1.493827307), (-12.68, 0), (-12.591698852, 1.493827307))
            Line((-12.591698852, 1.493827307), (-11.692460658, 1.493827307))
            ThreePointArc((-11.692460658, 1.493827307), (-11.561006493, 2.299627171), (-11.374088047, 3.094394503))
            Line((-11.374088047, 3.094394503), (-12.20487581, 3.438518062))
            ThreePointArc((-12.20487581, 3.438518062), (-11.714792472, 4.852425922), (-11.061549888, 6.19875101))
            Line((-11.061549888, 6.19875101), (-10.230762125, 5.854627451))
            ThreePointArc((-10.230762125, 5.854627451), (-9.800948055, 6.548784122), (-9.324113638, 7.211522801))
            Line((-9.324113638, 7.211522801), (-9.959971063, 7.847380226))
            ThreePointArc((-9.959971063, 7.847380226), (-8.966113985, 8.966113985), (-7.847380226, 9.959971063))
            Line((-7.847380226, 9.959971063), (-7.211522801, 9.324113638))
            ThreePointArc((-7.211522801, 9.324113638), (-6.548784122, 9.800948055), (-5.854627451, 10.230762125))
            Line((-5.854627451, 10.230762125), (-6.19875101, 11.061549888))
            ThreePointArc((-6.19875101, 11.061549888), (-4.852425922, 11.714792472), (-3.438518062, 12.20487581))
        make_face(mode=Mode.SUBTRACT)
    extrude(amount=BOSS_EXTRUDE1_4_DEPTH)

    # Boss-Extrude1 5 outline → Boss-Extrude1 5 (revolve)
    with BuildSketch(Plane.YX):
        Polygon((11.7875, 12.0000001), (11.7875, 11), (13.25, 11), (14.25, 12), align=None)
    revolve(axis=Axis((0, 0, 0), (1, 0, 0)))

    # Sketch2 → Cut-Extrude1 (cut)
    with BuildSketch(Plane(origin=(25, 0, 0), x_dir=(0, 0, -1), z_dir=(1, 0, 0))):
        Circle(SKETCH2_R)
    extrude(amount=-CUT_EXTRUDE1_DEPTH, mode=Mode.SUBTRACT)

    # Sketch3 → Boss-Extrude2 (add)
    with BuildSketch(Plane(origin=(18, 0, 0), x_dir=(0, 0, -1), z_dir=(1, 0, 0))):
        Circle(SKETCH3_R)
    extrude(amount=-BOSS_EXTRUDE2_DEPTH)

    # Sketch8 → Boss-Extrude3 (add)
    with BuildSketch(Plane(origin=(13, 0, 0), x_dir=(0, 0, -1), z_dir=(1, 0, 0))):
        with Locations(Location((0, 0, 0), (0, 0, 180))):
            Circle(SKETCH8_R)
    extrude(amount=-BOSS_EXTRUDE3_DEPTH)

    # Chamfer1
    chamfer1_edges = [part.edges().sort_by_distance(p)[0] for p in [
        (1, 0, -16),
        (11, 0, -16),
    ]]
    chamfer(chamfer1_edges, length=CHAMFER1_SIZE)

    # Sketch4 → Cut-Extrude2 (cut, through all)
    with BuildSketch(Plane(origin=(18, 0, 0), x_dir=(0, 0, -1), z_dir=(1, 0, 0))):
        Circle(SKETCH4_R)
    extrude(amount=-CUT_EXTRUDE2_DEPTH, mode=Mode.SUBTRACT)

    # Chamfer2
    chamfer2_edges = [part.edges().sort_by_distance(p)[0] for p in [
        (18, 0, 10),
        (-1, 0, 3.175),
        (18, 0, 3.175),
    ]]
    chamfer(chamfer2_edges, length=CHAMFER2_SIZE)

    # Sketch7 → Tap Drill for M3 Tap1 (revolve, cut)
    with BuildSketch(Plane.YZ.offset(15.5)):
        with Locations((0.625, 8)):
            Rectangle(SKETCH7_W, SKETCH7_H)
    revolve(axis=Axis((15.5, 0, -6.35), (0, 0, 1)), mode=Mode.SUBTRACT)


solid = part.part
